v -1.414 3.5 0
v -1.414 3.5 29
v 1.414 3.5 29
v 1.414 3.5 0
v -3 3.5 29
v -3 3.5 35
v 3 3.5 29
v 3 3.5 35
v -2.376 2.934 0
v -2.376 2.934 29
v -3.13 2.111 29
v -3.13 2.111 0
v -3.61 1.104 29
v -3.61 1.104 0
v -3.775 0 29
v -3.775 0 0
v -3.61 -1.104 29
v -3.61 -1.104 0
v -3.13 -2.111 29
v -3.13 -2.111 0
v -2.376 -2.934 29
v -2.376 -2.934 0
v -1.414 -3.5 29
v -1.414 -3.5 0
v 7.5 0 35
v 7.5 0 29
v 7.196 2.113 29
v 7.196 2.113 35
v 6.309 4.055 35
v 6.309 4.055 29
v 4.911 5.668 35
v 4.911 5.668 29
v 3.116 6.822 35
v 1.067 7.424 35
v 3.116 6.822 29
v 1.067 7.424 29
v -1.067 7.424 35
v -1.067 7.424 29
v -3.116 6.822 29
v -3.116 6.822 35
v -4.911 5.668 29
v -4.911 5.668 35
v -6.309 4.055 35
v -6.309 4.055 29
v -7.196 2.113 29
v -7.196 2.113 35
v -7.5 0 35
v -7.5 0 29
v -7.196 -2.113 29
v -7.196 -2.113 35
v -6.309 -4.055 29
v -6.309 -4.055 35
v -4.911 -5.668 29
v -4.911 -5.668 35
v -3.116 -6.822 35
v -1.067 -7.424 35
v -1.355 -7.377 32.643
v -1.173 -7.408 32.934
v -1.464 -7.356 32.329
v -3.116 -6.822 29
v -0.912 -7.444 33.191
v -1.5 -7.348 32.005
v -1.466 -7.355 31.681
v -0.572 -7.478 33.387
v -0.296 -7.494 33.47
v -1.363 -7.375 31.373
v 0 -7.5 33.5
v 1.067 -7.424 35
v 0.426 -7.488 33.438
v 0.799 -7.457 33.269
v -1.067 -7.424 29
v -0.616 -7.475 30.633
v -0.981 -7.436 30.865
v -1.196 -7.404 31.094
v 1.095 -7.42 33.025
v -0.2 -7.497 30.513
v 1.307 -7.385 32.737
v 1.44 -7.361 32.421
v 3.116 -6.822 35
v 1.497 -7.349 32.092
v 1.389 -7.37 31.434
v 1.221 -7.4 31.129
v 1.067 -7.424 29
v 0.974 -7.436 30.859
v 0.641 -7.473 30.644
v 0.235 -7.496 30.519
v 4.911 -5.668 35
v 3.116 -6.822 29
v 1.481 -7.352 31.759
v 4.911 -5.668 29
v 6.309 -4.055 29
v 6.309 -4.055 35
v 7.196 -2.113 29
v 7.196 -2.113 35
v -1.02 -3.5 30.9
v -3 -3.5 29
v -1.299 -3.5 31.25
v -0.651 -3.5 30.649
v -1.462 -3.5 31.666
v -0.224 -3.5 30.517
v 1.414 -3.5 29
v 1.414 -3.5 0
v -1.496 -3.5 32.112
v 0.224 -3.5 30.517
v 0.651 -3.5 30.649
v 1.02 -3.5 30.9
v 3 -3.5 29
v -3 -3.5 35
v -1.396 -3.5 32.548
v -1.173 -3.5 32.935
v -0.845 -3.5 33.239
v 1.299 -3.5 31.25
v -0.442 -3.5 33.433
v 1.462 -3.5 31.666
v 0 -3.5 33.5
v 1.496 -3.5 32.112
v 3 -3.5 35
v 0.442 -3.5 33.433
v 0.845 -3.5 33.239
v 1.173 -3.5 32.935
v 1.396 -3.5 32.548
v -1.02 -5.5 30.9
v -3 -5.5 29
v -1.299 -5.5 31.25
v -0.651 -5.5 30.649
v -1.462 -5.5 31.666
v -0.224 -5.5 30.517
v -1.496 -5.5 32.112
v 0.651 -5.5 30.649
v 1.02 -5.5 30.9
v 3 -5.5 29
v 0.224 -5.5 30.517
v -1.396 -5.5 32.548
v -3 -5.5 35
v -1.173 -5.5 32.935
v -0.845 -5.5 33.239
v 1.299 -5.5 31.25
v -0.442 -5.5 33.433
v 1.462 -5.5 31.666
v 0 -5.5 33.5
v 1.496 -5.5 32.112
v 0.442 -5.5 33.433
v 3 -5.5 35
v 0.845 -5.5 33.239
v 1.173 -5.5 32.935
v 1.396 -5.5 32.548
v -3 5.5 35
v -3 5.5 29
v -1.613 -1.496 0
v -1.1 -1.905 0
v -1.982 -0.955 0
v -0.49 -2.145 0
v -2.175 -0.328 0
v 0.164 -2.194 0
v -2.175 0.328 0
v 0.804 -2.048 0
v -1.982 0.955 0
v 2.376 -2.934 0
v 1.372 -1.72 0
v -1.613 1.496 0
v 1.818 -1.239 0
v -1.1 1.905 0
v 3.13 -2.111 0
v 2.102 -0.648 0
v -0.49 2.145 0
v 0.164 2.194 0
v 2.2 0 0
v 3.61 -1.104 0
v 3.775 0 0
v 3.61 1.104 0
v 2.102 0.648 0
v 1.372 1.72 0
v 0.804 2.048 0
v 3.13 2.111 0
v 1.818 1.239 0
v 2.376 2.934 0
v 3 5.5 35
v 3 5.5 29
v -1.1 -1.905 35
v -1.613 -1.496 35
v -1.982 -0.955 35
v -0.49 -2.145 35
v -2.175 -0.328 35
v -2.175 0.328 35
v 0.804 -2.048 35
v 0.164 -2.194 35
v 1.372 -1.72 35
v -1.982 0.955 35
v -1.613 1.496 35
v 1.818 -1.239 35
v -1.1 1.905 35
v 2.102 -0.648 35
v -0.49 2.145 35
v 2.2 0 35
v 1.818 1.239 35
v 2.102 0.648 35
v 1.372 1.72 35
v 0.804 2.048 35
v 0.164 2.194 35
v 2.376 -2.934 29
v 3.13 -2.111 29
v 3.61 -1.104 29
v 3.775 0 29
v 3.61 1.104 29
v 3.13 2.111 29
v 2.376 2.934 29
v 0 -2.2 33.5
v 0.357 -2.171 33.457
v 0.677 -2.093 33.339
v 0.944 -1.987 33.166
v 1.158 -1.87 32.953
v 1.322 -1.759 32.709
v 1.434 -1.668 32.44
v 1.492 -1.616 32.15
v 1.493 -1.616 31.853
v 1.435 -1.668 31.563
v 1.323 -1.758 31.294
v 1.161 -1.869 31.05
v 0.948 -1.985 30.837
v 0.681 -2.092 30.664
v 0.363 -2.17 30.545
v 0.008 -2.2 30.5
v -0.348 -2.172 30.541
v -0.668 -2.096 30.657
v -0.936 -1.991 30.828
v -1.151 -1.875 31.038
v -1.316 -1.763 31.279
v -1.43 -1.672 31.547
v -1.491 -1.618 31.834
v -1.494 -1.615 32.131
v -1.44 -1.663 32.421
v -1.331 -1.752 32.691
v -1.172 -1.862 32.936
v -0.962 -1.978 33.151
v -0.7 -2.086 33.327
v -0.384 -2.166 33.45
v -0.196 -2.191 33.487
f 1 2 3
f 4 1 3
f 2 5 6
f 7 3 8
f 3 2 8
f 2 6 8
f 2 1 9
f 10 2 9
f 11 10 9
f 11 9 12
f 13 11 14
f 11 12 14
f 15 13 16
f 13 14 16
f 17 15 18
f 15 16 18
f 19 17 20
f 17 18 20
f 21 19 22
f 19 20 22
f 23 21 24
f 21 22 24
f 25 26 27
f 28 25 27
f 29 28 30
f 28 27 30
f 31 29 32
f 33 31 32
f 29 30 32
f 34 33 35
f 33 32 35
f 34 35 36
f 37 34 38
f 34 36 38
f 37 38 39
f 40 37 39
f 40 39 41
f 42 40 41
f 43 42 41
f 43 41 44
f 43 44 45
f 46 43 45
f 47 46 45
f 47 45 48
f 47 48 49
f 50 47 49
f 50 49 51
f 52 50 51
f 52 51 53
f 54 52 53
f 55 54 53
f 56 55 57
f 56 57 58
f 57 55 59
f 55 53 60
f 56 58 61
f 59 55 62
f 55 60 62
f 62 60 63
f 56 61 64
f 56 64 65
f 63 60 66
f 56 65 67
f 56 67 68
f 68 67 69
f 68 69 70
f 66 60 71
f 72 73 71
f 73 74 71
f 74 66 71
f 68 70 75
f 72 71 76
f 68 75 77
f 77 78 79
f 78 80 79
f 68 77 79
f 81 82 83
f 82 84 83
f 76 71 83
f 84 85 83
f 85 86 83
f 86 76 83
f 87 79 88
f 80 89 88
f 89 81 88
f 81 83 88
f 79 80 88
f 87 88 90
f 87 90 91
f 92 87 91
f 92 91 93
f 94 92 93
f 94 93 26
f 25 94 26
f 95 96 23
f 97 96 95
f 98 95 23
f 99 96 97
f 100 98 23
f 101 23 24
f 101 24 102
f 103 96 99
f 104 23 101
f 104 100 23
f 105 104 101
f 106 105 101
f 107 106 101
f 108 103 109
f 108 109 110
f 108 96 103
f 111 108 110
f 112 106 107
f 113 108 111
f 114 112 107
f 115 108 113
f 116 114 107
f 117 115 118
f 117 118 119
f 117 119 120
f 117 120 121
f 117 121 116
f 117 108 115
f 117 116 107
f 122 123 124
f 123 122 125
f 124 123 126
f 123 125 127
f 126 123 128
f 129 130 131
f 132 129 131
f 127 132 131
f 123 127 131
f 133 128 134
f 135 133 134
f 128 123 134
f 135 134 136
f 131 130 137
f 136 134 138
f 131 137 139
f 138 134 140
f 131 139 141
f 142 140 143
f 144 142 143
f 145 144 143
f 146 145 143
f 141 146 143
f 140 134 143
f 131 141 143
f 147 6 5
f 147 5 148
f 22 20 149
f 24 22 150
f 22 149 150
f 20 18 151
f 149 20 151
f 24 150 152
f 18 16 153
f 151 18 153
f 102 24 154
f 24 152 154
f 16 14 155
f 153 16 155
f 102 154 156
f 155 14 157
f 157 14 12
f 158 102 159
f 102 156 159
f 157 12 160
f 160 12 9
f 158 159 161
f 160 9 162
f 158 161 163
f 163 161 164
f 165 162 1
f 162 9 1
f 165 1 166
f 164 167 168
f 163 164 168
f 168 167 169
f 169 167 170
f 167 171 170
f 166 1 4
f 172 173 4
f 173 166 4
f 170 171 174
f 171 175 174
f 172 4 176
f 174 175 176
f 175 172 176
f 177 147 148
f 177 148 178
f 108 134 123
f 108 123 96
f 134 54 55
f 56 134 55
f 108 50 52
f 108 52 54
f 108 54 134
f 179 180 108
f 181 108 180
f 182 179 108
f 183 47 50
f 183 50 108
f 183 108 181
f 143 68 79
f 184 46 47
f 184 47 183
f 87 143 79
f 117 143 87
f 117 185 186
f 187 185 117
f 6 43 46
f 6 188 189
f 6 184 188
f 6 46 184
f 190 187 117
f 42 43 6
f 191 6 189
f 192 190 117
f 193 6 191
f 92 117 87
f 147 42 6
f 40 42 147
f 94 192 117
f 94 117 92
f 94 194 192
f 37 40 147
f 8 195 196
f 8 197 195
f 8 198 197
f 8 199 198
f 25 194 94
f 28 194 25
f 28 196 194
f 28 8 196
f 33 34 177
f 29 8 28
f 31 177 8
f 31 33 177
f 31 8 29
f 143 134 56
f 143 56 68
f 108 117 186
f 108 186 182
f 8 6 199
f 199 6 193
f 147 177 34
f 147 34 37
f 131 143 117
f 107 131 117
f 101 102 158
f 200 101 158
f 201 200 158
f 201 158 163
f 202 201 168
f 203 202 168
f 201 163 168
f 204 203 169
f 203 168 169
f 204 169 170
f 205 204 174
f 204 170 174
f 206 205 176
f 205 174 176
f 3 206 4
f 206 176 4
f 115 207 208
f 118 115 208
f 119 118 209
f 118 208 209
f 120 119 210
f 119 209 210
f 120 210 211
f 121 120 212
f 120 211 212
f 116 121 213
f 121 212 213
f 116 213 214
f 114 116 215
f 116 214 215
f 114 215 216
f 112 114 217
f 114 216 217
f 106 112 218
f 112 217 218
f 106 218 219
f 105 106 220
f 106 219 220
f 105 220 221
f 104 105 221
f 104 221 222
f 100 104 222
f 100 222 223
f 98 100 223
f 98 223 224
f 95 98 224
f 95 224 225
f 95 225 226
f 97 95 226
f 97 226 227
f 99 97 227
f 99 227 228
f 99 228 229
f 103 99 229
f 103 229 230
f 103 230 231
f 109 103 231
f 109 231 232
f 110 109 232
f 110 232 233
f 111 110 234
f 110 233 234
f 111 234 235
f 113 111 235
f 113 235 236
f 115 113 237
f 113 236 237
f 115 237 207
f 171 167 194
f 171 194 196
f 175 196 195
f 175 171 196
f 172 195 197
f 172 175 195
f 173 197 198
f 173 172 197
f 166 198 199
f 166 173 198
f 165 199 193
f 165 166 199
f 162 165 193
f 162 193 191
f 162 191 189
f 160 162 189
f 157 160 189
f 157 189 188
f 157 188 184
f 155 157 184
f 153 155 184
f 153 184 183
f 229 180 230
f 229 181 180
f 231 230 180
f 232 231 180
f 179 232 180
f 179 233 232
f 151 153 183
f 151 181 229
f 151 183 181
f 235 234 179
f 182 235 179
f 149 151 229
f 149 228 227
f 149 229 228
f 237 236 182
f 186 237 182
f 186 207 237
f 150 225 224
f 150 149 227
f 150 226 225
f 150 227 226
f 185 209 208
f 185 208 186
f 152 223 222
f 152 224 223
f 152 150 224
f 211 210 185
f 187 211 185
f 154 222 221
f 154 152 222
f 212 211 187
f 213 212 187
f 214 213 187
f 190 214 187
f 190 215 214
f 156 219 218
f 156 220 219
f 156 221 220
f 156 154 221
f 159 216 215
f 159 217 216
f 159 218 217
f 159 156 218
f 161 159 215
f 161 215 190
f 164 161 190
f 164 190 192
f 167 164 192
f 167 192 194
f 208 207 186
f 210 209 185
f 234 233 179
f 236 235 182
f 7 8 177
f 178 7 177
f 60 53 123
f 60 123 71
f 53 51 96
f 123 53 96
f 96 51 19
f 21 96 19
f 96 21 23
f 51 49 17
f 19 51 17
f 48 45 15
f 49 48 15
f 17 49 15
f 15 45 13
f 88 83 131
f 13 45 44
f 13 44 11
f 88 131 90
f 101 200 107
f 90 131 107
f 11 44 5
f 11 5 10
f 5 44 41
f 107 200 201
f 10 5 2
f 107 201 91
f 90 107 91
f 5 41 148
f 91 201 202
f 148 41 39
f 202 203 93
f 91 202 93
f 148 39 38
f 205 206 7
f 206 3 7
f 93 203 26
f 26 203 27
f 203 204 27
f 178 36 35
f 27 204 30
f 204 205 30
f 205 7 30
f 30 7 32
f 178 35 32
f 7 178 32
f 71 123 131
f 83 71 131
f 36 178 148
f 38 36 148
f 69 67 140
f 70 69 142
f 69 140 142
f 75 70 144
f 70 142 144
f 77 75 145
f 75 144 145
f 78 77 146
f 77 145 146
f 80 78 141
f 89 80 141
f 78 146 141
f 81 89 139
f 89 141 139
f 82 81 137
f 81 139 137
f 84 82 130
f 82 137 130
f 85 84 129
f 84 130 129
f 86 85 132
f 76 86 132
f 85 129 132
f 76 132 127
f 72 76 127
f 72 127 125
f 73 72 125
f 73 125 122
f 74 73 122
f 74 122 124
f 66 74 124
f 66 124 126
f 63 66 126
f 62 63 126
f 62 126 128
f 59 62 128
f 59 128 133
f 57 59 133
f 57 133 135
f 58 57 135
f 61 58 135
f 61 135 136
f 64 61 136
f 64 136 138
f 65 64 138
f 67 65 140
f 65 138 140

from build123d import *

# Parameters (mm, degrees)
SKETCH1_R           = 3.775
SKETCH1_R_2         = 2.2
BOSS_EXTRUDE1_DEPTH = 35
BOSS_EXTRUDE2_START = -6
SKETCH2_R           = 7.5
SKETCH2_R_2         = 3.775
BOSS_EXTRUDE2_DEPTH = 6
SKETCH3_W           = 6
SKETCH3_H           = 2
CUT_EXTRUDE1_DEPTH  = 37.571847096
SKETCH4_R           = 1.5
CUT_EXTRUDE2_DEPTH  = 37.571847096


with BuildPart() as part:
    # Sketch1 → Boss-Extrude1 (new body)
    with BuildSketch(Plane.XY):
        Circle(SKETCH1_R)
        Circle(SKETCH1_R_2, mode=Mode.SUBTRACT)
    extrude(amount=BOSS_EXTRUDE1_DEPTH)

    # Sketch2 → Boss-Extrude2 (add)
    with BuildSketch(Plane.XY.offset(35).offset(BOSS_EXTRUDE2_START)):
        Circle(SKETCH2_R)
        Circle(SKETCH2_R_2, mode=Mode.SUBTRACT)
    extrude(amount=BOSS_EXTRUDE2_DEPTH)

    # Sketch3 → Cut-Extrude1 (cut, through all)
    with BuildSketch(Plane.XY.offset(35)):
        with Locations((0, 4.5)):
            Rectangle(SKETCH3_W, SKETCH3_H)
        with Locations((0, -4.5)):
            Rectangle(SKETCH3_W, SKETCH3_H)
    extrude(amount=-CUT_EXTRUDE1_DEPTH, mode=Mode.SUBTRACT)

    # Sketch4 → Cut-Extrude2 (cut, through all)
    with BuildSketch(Plane(origin=(0, 0, 0), x_dir=(1, 0, 0), z_dir=(0, 1, 0))):
        with Locations(Location((0, -32, 0), (0, 0, 270))):
            Circle(SKETCH4_R)
    extrude(amount=-CUT_EXTRUDE2_DEPTH, mode=Mode.SUBTRACT)


solid = part.part
